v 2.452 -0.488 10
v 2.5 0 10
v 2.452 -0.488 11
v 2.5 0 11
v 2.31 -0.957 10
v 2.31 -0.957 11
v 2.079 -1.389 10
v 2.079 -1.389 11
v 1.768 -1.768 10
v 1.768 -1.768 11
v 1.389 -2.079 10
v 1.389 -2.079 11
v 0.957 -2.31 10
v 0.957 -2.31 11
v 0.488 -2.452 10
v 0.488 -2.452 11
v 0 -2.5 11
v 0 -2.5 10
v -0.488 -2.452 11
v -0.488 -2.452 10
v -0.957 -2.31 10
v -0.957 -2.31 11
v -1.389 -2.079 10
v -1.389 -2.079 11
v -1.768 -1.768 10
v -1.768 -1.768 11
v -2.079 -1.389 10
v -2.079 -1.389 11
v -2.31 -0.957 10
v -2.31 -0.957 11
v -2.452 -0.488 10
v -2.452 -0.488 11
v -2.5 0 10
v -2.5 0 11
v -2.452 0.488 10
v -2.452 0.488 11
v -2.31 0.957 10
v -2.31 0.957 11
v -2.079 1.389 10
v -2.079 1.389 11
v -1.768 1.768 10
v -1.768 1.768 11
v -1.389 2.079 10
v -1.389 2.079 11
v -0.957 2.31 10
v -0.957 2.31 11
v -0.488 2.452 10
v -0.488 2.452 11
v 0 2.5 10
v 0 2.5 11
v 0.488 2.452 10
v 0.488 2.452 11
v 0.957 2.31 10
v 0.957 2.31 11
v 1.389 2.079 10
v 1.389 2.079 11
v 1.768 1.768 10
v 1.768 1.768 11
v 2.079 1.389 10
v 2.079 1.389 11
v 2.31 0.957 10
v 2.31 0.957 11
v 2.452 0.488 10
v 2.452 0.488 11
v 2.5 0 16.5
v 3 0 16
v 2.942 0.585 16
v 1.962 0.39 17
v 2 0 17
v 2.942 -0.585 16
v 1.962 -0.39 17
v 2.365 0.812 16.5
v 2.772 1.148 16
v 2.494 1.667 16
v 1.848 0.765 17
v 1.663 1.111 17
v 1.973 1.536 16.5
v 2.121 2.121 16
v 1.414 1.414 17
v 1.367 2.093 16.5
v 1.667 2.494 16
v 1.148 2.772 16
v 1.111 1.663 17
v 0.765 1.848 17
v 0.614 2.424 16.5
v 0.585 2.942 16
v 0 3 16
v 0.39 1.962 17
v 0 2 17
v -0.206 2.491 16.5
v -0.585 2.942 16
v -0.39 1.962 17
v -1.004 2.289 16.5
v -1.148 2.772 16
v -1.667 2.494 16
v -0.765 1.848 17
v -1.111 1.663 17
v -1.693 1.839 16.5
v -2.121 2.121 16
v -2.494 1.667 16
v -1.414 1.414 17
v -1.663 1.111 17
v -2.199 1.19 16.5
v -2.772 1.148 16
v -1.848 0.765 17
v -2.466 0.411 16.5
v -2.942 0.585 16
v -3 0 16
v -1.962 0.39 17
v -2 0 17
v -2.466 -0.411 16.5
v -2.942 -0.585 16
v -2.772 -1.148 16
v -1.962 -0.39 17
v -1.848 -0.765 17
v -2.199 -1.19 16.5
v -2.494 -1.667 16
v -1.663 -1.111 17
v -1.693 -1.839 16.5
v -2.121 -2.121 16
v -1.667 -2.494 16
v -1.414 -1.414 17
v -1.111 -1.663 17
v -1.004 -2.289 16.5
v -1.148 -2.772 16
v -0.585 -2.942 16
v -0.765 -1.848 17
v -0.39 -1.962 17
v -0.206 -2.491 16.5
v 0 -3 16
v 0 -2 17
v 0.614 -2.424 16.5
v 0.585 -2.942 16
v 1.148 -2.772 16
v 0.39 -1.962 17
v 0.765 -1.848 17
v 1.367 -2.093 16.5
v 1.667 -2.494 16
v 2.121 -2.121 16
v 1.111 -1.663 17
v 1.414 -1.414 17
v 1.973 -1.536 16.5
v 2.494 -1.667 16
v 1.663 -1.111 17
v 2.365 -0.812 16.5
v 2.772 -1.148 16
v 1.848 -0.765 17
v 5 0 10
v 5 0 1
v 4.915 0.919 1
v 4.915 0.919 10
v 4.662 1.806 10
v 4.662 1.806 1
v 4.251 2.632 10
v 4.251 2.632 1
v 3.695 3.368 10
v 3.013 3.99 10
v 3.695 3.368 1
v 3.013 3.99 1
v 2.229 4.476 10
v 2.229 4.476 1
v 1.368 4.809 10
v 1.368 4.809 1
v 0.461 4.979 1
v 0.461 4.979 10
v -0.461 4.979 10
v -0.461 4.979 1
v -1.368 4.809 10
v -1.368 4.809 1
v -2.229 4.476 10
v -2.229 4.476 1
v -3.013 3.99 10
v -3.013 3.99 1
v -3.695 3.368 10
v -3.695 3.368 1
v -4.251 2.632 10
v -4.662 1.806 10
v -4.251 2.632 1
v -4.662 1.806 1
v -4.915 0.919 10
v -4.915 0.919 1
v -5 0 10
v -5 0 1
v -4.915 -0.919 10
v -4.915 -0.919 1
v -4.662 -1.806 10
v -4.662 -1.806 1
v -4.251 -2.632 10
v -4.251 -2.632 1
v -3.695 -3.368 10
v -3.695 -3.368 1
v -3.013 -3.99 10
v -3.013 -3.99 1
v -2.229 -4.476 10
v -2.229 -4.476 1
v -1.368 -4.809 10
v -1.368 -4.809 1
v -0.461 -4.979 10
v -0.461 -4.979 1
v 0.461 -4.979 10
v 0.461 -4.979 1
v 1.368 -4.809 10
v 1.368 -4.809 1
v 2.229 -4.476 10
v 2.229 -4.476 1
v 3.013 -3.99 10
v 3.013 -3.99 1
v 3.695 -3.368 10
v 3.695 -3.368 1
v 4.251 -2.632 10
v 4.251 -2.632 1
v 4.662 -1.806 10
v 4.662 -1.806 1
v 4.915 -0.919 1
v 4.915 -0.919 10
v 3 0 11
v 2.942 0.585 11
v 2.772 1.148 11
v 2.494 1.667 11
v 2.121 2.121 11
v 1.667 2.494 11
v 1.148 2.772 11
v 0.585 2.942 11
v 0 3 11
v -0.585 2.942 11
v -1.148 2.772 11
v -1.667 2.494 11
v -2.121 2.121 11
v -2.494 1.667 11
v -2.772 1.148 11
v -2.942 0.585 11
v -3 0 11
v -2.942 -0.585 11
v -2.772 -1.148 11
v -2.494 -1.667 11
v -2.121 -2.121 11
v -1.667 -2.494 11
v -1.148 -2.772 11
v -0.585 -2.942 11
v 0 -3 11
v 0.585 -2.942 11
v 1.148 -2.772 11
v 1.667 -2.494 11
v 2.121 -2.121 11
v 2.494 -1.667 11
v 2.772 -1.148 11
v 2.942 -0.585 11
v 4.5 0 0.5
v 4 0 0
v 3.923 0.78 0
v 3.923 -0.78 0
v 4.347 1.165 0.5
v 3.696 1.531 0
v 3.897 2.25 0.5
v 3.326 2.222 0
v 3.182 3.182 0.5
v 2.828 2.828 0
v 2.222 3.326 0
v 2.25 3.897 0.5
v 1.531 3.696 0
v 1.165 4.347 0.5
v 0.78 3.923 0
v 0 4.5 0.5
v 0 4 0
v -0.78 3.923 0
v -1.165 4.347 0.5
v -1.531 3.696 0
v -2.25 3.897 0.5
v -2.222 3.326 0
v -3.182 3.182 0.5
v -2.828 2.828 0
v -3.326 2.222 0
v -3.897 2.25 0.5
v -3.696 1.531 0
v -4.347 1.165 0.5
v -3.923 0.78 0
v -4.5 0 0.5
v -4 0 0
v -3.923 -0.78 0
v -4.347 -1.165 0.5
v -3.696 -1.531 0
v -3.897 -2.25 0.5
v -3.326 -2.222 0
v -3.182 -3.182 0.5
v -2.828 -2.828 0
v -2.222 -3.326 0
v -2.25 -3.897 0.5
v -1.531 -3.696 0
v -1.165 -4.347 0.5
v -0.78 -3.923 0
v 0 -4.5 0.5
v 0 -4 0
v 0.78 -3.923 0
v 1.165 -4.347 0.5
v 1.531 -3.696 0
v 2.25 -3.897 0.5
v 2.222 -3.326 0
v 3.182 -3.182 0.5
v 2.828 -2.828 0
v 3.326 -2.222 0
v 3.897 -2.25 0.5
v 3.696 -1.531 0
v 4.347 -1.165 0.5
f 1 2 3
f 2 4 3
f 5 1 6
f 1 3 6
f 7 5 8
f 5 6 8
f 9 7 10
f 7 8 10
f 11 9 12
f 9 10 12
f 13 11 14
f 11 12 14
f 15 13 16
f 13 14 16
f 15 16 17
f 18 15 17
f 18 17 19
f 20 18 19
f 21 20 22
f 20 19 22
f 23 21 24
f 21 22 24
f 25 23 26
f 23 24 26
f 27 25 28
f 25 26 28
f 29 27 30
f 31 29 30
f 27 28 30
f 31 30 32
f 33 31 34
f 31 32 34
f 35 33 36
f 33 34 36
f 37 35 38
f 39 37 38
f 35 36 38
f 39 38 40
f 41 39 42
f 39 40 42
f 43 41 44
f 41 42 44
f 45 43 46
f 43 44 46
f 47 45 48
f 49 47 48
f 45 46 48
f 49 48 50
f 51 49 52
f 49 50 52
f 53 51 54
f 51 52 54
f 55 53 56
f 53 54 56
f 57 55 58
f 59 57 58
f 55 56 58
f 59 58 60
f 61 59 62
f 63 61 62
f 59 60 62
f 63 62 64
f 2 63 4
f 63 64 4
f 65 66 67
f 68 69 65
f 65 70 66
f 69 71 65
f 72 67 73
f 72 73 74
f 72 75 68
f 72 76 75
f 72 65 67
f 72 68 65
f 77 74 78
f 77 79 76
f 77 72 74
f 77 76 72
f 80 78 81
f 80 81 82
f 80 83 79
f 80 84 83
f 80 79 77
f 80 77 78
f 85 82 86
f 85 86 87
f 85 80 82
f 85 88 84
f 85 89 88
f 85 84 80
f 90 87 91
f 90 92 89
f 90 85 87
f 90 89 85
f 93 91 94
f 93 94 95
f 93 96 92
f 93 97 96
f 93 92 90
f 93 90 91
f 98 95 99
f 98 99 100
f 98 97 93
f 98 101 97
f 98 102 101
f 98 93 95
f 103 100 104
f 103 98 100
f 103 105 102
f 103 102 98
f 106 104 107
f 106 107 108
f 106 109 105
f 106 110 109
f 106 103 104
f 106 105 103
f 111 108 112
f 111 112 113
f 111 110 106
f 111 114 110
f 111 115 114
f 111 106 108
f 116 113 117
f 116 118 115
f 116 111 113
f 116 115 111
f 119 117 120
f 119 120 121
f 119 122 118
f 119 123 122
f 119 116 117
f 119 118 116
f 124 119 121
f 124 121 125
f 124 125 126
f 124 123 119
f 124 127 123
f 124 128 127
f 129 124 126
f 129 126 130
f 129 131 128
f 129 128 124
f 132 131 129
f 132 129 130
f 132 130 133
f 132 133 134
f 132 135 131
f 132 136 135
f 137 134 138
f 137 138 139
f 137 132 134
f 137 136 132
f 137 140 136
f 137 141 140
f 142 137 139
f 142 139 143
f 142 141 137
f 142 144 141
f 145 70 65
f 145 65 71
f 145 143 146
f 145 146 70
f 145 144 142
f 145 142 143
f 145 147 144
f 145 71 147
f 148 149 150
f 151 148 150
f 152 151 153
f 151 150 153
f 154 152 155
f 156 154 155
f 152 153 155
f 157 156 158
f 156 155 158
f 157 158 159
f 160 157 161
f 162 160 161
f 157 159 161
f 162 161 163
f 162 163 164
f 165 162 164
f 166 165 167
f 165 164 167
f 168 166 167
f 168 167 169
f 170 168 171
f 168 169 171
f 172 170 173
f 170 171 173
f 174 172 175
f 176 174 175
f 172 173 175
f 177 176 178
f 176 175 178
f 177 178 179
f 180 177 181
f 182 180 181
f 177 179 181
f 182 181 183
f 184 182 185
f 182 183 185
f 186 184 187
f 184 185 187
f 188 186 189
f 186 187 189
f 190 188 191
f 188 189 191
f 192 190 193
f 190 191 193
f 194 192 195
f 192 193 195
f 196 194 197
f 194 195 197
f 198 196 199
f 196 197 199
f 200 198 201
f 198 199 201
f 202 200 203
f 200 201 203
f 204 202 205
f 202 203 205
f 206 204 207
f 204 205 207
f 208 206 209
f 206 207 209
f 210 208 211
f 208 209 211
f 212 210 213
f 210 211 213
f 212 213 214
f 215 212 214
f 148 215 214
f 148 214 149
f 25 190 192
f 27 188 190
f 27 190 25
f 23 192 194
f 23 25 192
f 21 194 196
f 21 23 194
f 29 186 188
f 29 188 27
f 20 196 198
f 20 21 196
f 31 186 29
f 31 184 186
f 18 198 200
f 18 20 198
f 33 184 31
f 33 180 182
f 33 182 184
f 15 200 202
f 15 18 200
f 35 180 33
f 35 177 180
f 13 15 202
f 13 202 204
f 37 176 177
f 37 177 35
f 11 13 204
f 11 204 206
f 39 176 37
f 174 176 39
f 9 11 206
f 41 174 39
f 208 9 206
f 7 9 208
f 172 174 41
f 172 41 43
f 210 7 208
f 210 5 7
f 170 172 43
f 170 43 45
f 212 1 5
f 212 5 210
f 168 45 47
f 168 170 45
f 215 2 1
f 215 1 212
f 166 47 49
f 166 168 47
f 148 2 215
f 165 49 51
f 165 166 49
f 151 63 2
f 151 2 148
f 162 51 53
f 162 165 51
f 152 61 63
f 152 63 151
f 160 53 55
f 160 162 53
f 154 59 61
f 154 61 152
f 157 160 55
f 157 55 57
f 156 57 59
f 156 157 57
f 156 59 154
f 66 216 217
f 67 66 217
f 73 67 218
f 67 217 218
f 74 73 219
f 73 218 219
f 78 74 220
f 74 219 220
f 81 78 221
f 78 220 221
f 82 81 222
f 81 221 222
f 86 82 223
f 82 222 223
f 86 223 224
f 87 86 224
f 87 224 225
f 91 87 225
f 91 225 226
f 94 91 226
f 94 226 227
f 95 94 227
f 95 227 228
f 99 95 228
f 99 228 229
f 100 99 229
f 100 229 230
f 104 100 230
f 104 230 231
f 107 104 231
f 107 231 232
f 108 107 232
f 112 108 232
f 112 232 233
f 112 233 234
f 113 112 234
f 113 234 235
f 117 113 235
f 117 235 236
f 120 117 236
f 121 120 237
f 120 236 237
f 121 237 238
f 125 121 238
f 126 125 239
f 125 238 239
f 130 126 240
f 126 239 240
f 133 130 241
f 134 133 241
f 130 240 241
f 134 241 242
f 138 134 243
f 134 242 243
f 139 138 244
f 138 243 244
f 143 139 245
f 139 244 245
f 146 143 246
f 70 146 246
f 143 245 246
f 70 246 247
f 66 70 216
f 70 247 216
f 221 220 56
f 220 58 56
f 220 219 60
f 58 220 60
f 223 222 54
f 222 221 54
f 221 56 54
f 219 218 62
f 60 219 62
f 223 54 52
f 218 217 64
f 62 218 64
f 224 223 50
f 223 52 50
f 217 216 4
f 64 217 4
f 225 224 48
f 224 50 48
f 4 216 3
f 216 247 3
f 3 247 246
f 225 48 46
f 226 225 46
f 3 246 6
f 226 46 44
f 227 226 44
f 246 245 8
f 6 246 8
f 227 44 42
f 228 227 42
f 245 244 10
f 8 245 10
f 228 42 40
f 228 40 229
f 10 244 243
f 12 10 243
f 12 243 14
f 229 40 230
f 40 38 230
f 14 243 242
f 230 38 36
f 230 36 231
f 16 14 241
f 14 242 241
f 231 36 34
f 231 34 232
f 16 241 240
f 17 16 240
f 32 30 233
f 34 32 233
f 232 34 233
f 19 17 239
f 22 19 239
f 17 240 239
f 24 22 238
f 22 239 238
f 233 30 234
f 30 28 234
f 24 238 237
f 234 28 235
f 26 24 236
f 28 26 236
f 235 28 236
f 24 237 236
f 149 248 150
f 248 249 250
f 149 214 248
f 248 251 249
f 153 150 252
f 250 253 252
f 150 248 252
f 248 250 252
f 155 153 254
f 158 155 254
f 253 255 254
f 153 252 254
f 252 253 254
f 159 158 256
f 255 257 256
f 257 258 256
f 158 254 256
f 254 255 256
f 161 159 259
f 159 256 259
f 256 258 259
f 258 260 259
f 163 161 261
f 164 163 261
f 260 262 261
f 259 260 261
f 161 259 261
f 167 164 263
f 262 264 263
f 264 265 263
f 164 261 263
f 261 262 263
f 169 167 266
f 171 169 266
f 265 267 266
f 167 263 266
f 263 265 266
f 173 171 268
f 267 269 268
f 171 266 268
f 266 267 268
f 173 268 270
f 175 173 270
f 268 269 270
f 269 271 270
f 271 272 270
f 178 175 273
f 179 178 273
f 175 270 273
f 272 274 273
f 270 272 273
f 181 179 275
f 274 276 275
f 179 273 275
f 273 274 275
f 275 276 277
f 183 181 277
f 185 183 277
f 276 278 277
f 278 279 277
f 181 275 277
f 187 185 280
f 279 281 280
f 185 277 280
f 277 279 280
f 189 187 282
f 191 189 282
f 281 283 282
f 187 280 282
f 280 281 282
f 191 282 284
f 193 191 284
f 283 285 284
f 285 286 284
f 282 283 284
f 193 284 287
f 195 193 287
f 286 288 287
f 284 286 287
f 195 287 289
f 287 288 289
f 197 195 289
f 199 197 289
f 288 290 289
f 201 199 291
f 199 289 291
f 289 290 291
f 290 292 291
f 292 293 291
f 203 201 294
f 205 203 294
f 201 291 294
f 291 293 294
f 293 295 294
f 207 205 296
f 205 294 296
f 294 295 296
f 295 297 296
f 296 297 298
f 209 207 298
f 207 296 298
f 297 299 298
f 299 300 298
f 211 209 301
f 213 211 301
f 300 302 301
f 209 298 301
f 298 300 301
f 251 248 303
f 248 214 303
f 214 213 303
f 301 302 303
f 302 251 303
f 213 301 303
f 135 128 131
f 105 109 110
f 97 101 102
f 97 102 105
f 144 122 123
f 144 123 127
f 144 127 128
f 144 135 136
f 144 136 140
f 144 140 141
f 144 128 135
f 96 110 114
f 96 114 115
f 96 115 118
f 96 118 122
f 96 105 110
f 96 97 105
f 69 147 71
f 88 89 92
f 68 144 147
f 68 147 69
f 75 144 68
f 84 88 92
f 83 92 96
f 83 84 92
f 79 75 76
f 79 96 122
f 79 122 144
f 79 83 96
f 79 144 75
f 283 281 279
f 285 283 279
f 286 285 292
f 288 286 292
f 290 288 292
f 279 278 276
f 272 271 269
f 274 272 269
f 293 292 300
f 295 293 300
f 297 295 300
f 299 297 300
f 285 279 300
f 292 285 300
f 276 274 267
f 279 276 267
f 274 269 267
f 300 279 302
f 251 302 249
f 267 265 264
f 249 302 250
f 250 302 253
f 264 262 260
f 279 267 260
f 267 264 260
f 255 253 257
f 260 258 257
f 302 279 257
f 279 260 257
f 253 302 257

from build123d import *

# Parameters (mm, degrees)
F0_R     = 5
F1_DEPTH = 10
F2_R     = 3
F3_DEPTH = 7
F4_W     = 0.5
F4_H     = 1
F6_SIZE  = 1
F7_SIZE  = 1


with BuildPart() as f1:
    # F0 (on Top) → F1 (new body)
    with BuildSketch(Plane.XY):
        Circle(F0_R)
    extrude(amount=F1_DEPTH)

    # F2 (on face) → F3 (join)
    with BuildSketch(Plane.XY.offset(10)):
        Circle(F2_R)
    extrude(amount=F3_DEPTH)

    # F4 (on Front) → F5 (revolve, cut)
    with BuildSketch(Plane.XZ):
        with Locations((2.75, 10.5)):
            Rectangle(F4_W, F4_H)
    revolve(axis=Axis((0, 0, 10), (0, 0, -1)), mode=Mode.SUBTRACT)

    # F6
    f6_edges = [f1.edges().sort_by_distance(p)[0] for p in [
        (-3, 0, 17),
    ]]
    chamfer(f6_edges, length=F6_SIZE)

    # F7
    f7_edges = [f1.edges().sort_by_distance(p)[0] for p in [
        (-5, 0, 0),
    ]]
    chamfer(f7_edges, length=F7_SIZE)


solid = f1.part
